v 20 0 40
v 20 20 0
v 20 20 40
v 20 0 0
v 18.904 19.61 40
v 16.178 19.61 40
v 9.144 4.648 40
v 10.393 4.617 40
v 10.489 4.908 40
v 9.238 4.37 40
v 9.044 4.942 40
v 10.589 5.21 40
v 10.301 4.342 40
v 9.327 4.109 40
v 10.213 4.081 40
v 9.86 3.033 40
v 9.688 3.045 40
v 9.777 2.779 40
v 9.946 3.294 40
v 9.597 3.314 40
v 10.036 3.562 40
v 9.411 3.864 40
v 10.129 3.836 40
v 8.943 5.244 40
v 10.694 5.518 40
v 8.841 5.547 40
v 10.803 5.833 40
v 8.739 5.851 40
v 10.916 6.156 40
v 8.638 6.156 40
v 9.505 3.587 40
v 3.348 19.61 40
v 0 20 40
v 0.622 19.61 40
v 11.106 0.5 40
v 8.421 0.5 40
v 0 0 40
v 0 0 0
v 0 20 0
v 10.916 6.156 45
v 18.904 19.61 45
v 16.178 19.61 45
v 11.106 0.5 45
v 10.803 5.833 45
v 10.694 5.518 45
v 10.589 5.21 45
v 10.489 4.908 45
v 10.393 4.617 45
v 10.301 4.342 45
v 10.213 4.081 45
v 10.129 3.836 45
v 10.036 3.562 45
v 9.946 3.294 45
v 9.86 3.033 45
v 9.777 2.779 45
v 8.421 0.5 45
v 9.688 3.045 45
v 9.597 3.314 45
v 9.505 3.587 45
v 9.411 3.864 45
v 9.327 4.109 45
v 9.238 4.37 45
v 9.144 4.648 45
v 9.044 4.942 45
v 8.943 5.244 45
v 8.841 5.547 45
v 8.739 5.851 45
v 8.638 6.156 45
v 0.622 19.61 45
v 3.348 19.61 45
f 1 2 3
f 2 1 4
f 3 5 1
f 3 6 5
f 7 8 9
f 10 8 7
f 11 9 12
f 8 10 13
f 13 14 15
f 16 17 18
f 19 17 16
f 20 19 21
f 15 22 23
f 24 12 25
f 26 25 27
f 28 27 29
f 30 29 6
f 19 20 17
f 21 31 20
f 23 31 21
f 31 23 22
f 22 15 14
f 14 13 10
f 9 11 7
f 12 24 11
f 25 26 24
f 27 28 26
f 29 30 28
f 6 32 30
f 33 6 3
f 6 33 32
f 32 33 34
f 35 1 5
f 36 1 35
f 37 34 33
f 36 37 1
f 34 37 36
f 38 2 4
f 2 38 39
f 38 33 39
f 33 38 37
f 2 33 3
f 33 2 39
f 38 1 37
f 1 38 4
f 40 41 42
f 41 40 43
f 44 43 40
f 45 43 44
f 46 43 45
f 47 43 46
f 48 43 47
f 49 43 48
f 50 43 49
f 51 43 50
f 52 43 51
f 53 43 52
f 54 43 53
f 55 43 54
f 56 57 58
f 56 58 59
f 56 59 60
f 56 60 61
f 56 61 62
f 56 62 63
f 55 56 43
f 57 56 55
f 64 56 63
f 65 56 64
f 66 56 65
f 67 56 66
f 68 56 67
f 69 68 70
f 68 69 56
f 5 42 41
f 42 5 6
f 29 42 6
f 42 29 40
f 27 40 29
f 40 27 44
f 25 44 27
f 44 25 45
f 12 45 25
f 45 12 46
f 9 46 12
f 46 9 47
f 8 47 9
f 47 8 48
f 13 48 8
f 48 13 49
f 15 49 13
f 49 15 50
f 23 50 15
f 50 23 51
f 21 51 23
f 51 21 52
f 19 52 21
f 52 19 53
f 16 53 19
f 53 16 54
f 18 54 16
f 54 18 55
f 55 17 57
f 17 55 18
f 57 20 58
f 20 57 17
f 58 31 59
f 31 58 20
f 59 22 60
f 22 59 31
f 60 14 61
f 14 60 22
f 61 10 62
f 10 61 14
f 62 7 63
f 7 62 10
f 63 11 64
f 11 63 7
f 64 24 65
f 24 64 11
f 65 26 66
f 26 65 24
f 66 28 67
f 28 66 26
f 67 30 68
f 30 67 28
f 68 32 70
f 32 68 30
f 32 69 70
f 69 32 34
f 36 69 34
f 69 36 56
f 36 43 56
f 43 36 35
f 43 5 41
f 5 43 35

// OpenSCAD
cube([20, 20, 40]);
translate([0.5, 0.5, 40]){
    linear_extrude(5){
        text("V", size=20);
    }
}
